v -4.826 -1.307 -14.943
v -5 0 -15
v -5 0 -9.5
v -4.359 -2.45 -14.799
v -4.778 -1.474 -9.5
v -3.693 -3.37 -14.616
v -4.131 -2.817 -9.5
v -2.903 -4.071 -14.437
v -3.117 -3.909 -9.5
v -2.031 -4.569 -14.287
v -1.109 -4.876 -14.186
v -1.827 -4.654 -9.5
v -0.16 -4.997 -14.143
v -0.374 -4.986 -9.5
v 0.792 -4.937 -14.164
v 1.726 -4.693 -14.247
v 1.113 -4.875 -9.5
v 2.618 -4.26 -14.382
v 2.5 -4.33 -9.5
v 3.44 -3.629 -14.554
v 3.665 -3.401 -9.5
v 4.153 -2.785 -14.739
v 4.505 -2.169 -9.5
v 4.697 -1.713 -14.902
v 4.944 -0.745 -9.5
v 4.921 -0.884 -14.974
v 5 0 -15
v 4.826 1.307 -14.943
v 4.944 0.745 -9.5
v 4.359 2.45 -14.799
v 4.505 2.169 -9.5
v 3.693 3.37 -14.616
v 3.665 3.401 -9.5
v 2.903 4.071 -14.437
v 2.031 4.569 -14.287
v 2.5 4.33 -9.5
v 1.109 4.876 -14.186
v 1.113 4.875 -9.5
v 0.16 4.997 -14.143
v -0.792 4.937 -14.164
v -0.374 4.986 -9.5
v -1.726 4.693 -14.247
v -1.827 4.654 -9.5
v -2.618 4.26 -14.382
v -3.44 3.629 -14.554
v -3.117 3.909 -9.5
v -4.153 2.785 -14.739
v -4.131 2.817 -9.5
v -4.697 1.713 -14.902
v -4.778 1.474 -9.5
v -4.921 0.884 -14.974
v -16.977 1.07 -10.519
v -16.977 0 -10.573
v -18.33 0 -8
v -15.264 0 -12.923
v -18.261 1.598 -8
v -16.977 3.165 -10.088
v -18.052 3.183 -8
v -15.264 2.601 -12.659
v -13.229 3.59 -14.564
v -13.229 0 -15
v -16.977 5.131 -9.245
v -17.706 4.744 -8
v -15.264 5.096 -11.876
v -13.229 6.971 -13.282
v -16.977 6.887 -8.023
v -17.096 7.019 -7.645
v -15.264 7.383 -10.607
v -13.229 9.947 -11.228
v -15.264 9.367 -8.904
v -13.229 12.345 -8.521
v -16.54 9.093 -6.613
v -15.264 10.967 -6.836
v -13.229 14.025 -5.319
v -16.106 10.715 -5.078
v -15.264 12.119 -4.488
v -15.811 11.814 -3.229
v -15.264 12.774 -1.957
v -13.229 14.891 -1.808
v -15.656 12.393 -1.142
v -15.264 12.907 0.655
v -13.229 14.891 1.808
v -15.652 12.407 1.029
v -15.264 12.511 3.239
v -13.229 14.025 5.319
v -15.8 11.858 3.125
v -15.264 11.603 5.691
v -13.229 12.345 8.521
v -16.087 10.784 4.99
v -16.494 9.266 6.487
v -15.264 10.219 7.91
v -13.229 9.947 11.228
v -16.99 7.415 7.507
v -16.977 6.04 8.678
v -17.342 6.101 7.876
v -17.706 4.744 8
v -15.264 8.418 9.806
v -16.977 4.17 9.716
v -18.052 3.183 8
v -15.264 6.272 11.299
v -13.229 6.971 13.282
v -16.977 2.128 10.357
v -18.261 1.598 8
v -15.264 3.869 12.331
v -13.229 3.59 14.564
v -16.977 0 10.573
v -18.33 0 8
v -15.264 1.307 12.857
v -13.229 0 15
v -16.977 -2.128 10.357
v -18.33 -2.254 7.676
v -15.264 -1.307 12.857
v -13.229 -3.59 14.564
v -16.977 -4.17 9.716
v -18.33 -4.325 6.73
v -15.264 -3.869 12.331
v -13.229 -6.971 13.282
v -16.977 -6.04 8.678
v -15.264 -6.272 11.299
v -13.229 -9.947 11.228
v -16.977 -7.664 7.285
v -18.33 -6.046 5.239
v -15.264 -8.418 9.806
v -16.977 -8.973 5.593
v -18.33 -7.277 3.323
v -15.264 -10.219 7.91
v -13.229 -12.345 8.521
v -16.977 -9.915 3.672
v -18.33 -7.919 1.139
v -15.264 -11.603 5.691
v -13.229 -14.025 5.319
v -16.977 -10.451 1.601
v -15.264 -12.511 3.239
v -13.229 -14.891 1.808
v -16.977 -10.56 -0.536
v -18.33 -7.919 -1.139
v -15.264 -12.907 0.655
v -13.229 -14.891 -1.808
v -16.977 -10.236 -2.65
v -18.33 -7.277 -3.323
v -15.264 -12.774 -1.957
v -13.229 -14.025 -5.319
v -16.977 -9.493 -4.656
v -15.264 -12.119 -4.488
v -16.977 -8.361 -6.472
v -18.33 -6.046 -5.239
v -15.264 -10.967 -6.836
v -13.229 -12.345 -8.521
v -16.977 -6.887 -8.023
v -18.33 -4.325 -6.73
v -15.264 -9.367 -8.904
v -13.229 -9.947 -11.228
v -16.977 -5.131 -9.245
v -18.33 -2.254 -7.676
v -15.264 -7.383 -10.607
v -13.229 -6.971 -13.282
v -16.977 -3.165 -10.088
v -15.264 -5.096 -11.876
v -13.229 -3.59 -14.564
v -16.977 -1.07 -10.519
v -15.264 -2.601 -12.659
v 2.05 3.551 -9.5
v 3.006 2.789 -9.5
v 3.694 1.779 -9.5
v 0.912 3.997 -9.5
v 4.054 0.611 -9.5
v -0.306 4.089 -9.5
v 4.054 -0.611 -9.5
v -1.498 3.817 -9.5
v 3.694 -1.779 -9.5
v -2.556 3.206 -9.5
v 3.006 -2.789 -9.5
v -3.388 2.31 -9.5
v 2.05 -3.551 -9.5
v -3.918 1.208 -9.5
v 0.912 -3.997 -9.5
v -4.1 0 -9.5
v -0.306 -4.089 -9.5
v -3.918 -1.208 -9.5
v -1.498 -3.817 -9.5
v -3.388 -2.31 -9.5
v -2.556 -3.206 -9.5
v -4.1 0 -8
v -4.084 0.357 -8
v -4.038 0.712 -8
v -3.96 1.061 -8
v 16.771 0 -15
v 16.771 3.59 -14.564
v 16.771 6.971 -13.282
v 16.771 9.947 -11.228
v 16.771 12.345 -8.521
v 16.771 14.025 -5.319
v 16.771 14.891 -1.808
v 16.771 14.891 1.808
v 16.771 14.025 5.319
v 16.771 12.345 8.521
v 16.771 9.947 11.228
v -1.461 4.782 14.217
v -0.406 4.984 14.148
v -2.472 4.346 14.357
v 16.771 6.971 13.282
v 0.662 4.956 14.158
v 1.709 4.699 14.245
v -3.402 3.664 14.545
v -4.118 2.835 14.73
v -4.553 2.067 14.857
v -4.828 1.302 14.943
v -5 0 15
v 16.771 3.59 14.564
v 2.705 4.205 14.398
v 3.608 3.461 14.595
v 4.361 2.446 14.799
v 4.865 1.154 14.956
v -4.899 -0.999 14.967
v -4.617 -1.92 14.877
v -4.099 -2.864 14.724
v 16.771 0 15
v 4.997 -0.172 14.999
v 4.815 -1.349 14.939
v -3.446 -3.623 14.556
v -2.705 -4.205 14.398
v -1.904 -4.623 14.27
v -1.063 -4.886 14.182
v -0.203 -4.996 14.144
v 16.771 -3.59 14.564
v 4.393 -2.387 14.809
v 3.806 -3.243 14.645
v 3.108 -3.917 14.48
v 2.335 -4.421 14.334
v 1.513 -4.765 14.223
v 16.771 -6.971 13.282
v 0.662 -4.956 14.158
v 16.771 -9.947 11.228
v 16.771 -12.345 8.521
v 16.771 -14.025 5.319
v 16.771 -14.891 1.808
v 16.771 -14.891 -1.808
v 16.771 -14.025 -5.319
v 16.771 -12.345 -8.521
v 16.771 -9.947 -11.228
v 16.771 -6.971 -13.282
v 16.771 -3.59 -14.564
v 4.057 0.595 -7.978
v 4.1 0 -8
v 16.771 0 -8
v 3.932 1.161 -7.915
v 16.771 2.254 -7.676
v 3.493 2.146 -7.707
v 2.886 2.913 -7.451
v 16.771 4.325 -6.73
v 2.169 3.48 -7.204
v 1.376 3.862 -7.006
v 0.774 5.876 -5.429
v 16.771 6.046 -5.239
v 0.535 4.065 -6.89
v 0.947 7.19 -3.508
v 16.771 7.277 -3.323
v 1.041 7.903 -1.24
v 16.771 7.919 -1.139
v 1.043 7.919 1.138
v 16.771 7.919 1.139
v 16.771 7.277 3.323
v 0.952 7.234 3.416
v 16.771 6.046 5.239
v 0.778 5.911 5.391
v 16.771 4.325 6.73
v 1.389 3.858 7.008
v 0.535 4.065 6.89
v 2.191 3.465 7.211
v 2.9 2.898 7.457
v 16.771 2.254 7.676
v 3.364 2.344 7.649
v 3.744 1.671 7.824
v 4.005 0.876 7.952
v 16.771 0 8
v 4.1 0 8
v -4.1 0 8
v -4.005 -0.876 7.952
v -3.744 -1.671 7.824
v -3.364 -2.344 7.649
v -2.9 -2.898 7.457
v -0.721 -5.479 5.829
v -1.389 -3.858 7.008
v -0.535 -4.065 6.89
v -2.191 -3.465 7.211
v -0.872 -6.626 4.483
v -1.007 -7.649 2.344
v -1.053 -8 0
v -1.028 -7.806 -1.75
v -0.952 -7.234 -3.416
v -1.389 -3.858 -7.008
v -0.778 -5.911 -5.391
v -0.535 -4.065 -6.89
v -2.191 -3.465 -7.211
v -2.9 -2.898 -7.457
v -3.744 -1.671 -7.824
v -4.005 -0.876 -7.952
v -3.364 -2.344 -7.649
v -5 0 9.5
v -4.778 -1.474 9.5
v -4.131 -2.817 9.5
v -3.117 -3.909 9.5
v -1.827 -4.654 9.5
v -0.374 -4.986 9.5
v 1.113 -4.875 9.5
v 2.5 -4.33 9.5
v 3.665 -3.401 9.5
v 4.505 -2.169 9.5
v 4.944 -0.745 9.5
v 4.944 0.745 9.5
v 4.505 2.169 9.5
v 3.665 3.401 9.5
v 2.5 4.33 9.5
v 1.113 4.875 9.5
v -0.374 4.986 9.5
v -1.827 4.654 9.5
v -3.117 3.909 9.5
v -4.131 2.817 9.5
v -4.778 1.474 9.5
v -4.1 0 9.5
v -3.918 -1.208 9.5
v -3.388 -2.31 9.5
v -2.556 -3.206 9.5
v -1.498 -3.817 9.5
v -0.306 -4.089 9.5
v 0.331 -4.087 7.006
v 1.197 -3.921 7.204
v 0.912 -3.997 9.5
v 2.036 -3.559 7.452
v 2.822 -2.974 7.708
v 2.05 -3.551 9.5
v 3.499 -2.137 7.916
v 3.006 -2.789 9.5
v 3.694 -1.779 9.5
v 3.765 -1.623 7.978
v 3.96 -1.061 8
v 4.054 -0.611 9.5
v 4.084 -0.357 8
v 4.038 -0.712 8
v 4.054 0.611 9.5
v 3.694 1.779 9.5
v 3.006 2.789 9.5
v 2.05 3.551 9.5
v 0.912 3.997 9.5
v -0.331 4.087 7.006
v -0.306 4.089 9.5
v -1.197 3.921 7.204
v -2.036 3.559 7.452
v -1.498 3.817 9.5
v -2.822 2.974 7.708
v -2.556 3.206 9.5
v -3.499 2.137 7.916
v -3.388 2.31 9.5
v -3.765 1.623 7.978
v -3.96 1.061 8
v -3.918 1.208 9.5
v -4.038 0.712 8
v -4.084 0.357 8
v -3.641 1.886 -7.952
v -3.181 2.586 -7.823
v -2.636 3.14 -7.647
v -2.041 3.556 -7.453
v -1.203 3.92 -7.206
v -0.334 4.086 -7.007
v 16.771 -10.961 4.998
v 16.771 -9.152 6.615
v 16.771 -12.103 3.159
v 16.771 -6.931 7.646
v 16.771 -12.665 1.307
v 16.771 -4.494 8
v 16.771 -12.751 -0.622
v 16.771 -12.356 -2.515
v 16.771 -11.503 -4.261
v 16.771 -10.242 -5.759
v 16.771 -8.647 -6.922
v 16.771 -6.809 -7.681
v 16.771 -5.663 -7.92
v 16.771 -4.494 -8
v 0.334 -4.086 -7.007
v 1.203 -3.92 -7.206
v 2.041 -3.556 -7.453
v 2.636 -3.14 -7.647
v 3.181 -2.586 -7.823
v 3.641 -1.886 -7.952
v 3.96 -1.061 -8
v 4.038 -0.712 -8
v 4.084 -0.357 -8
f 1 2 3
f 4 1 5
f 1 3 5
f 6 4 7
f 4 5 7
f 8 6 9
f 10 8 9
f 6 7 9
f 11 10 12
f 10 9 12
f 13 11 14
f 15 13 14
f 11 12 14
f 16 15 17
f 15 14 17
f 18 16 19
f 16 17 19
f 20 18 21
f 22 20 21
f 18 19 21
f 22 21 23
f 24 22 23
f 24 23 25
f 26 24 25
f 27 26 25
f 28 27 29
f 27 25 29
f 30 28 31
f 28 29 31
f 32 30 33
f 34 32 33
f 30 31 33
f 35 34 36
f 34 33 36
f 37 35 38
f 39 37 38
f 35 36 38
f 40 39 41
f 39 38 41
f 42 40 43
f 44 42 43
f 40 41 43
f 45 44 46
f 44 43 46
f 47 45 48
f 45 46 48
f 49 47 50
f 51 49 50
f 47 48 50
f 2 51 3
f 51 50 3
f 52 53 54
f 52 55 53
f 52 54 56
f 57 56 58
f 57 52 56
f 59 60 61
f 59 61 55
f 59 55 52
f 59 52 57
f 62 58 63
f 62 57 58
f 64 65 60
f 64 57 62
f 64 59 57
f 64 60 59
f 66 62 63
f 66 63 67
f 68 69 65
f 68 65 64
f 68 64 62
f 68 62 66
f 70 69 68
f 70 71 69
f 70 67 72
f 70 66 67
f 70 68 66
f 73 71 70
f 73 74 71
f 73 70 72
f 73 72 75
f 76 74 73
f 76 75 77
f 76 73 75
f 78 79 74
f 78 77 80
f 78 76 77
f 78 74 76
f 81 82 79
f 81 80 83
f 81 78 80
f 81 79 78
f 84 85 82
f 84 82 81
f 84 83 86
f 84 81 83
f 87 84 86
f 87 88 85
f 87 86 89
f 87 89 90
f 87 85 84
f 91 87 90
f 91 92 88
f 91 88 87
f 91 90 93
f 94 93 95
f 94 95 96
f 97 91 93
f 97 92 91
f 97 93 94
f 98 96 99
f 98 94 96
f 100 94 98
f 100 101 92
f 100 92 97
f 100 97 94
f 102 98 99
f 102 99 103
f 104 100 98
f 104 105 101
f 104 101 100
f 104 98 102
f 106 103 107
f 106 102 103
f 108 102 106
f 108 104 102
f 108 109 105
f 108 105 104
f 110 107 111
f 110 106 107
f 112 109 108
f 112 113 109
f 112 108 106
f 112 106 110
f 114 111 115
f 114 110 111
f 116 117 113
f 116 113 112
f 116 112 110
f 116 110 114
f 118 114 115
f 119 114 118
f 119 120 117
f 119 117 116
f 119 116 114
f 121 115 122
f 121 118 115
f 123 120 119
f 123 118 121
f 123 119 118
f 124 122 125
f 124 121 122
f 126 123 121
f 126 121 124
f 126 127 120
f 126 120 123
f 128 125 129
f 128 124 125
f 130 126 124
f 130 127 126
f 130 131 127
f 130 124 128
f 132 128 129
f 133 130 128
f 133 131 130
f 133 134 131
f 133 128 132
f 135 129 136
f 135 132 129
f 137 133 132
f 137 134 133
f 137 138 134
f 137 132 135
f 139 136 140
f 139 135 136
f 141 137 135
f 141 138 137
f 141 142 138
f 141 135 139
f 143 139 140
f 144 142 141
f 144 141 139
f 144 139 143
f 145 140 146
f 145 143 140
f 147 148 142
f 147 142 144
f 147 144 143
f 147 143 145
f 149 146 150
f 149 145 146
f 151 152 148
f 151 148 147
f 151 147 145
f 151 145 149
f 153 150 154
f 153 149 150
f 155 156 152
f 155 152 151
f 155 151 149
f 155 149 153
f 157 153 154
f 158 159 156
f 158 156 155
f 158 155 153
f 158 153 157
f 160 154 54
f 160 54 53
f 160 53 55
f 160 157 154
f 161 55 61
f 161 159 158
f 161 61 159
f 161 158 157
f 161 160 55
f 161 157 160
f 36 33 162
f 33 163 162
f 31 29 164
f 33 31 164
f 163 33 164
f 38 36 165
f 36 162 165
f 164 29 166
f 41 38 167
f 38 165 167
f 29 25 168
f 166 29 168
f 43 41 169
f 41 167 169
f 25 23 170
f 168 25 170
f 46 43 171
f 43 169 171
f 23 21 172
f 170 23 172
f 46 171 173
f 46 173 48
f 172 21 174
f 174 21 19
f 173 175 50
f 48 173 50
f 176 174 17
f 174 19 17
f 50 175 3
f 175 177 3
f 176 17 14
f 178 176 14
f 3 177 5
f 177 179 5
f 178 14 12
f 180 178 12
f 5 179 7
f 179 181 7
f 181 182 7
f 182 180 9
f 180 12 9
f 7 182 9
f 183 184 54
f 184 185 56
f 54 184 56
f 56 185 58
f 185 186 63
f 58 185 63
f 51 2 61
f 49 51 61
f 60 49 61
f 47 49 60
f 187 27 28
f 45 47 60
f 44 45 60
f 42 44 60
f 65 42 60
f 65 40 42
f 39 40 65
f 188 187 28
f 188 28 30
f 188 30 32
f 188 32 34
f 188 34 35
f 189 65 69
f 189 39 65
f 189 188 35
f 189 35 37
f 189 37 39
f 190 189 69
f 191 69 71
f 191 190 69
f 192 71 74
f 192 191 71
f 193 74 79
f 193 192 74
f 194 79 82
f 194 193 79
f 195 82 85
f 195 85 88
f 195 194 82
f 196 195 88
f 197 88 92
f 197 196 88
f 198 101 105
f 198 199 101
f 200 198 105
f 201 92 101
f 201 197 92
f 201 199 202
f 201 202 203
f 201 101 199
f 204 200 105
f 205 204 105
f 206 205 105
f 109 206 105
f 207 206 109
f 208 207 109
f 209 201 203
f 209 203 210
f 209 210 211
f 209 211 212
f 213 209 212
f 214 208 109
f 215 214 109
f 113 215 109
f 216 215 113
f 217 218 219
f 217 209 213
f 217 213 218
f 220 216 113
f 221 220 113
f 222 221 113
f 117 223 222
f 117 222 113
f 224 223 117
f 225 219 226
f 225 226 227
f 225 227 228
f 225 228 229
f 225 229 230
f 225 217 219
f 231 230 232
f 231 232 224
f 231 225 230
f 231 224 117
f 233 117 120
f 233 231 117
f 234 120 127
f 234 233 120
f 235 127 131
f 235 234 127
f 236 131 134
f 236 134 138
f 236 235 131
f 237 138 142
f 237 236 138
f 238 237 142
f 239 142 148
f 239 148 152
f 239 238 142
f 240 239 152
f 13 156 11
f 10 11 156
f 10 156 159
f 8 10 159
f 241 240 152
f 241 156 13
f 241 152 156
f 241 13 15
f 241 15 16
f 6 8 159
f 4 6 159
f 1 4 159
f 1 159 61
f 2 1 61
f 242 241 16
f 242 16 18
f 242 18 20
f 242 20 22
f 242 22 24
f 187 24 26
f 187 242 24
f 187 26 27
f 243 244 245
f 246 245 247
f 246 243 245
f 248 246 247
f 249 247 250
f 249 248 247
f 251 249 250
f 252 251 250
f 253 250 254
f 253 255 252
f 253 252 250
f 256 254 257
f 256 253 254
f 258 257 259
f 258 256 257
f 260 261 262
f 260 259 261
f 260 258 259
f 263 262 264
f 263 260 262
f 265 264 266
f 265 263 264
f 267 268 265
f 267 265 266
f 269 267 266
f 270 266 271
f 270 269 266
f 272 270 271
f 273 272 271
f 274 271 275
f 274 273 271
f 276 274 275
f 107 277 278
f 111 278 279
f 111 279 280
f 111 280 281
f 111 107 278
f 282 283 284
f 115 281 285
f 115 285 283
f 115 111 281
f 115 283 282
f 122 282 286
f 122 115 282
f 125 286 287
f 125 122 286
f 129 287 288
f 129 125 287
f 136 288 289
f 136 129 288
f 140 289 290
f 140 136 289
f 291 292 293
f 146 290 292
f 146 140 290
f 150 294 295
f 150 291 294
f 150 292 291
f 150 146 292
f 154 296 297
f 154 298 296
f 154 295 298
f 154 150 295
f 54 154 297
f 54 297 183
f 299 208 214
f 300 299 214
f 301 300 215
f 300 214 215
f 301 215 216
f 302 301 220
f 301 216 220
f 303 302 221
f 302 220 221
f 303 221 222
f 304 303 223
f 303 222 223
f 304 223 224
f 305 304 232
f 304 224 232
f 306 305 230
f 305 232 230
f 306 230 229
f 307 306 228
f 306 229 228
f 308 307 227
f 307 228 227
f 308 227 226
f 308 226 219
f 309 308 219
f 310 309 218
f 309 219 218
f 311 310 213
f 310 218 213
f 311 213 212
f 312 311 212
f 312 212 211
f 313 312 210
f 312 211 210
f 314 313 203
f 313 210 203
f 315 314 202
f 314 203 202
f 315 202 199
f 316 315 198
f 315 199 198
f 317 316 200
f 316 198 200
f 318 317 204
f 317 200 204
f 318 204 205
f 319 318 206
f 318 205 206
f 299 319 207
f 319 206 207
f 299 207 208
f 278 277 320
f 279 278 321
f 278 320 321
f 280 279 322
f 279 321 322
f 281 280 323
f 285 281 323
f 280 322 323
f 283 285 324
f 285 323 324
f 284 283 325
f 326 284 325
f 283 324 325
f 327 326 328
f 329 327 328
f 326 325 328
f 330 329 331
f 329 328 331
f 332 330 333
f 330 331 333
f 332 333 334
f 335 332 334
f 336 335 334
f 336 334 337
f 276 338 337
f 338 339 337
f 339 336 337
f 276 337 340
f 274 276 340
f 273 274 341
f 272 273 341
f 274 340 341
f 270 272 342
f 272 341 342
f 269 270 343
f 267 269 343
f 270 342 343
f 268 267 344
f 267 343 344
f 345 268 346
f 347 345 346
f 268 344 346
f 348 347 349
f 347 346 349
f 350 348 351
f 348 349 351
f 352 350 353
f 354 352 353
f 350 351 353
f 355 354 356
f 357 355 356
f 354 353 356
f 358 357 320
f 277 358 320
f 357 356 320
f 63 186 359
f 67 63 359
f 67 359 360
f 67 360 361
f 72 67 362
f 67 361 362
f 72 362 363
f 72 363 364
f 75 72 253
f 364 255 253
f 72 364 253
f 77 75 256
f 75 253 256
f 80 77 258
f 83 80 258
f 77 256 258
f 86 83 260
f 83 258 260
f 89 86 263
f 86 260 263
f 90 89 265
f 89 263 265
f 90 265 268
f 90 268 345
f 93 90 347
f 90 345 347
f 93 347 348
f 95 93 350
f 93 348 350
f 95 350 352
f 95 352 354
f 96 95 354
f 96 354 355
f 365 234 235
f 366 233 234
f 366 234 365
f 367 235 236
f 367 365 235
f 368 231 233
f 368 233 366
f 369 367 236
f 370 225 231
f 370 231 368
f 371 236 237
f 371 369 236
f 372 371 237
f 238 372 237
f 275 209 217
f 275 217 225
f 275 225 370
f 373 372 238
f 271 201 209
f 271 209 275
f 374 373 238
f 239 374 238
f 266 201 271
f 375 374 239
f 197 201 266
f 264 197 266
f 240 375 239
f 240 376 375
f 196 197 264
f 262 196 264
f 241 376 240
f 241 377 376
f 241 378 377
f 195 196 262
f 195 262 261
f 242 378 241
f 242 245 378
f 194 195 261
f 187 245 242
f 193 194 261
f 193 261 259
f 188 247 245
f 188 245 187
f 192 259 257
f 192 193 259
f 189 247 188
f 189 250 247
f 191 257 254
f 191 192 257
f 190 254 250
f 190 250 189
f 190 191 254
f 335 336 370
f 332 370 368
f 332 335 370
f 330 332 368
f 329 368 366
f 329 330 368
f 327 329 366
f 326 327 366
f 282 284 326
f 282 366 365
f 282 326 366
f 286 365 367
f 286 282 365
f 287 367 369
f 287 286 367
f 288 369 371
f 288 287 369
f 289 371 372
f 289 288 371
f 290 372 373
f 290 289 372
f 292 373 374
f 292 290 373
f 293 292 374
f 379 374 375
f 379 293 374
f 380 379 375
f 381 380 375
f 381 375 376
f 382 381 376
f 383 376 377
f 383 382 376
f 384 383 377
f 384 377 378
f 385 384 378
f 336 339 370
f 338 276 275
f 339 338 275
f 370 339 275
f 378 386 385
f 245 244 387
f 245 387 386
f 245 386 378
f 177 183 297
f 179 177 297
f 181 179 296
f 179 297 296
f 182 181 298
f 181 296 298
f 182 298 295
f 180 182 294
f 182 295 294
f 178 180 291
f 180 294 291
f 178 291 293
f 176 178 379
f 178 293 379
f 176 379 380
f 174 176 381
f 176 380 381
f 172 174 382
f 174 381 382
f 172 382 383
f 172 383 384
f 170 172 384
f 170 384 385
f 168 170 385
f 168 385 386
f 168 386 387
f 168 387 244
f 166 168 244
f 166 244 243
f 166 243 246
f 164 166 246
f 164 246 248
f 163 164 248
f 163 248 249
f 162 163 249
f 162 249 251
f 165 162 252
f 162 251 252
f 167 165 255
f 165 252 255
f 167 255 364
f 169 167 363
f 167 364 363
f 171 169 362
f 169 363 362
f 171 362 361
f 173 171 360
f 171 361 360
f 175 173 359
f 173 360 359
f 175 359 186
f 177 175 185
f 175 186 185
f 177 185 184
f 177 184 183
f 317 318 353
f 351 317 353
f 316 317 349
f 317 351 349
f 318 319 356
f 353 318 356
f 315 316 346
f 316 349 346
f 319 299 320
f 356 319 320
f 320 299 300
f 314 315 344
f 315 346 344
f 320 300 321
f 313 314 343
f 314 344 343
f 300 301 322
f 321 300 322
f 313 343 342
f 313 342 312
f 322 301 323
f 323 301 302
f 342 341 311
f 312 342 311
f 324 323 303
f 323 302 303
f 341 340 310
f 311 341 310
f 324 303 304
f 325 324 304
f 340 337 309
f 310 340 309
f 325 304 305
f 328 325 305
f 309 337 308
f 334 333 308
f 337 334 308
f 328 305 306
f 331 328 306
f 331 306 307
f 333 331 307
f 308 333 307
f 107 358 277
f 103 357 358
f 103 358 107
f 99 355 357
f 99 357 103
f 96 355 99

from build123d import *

# Parameters (mm, degrees)
SCHNITT_LINEAR_AUSTRAGEN1_DEPTH      = 29.03569171
SCHNITT_LINEAR_AUSTRAGEN1_DEPTH_BACK = 29.03569171
SKIZZE8_R                            = 8
SCHNITT_LINEAR_AUSTRAGEN2_DEPTH      = 8
SCHNITT_LINEAR_AUSTRAGEN2_DEPTH_BACK = 8


with BuildPart() as part:
    # Skizze4 → Rotation1 (revolve)
    with BuildSketch(Plane(origin=(0, 0, 0), x_dir=(1, 0, 0), z_dir=(0, 1, 0))):
        with BuildLine():
            Line((-13.228756555, 15), (16.771243445, 15))
            Line((16.771243445, 15), (16.771243445, 8))
            Line((16.771243445, 8), (-18.33030278, 8))
            ThreePointArc((-18.33030278, 8), (-16.163030549, 11.779492496), (-13.228756555, 15))
        make_face()
    revolve(axis=Axis((-20, 0, 0), (1, 0, 0)))

    # Skizze6 → Schnitt-Rotation1 (revolve, cut)
    with BuildSketch(Plane(origin=(0, 0, 0), x_dir=(1, 0, 0), z_dir=(0, 1, 0))):
        Polygon((-4.1, 9.5), (-4.1, -9.5), (-5, -9.5), (-5, -15), (0, -15), (0, 15), (-5, 15), (-5, 9.5), align=None)
    revolve(axis=Axis((0, 0, -15), (0, 0, 1)), mode=Mode.SUBTRACT)

    # Skizze8 → Schnitt-Linear austragen1 (cut, two sides: drawn at the far end of the back side and taken through both)
    with BuildSketch(Plane(origin=(0, 0, 0), x_dir=(0, 0, -1), z_dir=(0.9659258262890682, -0.25881904510252124, 0)).offset(-SCHNITT_LINEAR_AUSTRAGEN1_DEPTH_BACK)):
        Circle(SKIZZE8_R)
    extrude(amount=SCHNITT_LINEAR_AUSTRAGEN1_DEPTH + SCHNITT_LINEAR_AUSTRAGEN1_DEPTH_BACK, mode=Mode.SUBTRACT)

    # Skizze9 → Schnitt-Linear austragen2 (cut, two sides: drawn at the far end of the back side and taken through both)
    with BuildSketch(Plane.XY.offset(-SCHNITT_LINEAR_AUSTRAGEN2_DEPTH_BACK)):
        with BuildLine():
            Line((-17.705712859, 4.744231462), (-3.960295888, 1.061158085))
            ThreePointArc((-3.960295888, 1.061158085), (-4.064923932, 0.535157388), (-4.1, 0))
            Line((-4.1, 0), (-18.33030278, 0))
            Line((-18.33030278, 0), (-18.33030278, 2.413230142))
            Line((-18.33030278, 2.413230142), (-17.705712859, 4.744231462))
        make_face()
        with BuildLine():
            Line((16.771243445, -4.493841137), (16.771243445, 0))
            Line((16.771243445, 0), (4.1, 0))
            ThreePointArc((4.1, 0), (4.064923932, -0.535157388), (3.960295888, -1.061158085))
            Line((3.960295888, -1.061158085), (16.771243445, -4.493841137))
        make_face()
    extrude(amount=SCHNITT_LINEAR_AUSTRAGEN2_DEPTH + SCHNITT_LINEAR_AUSTRAGEN2_DEPTH_BACK, mode=Mode.SUBTRACT)


solid = part.part
